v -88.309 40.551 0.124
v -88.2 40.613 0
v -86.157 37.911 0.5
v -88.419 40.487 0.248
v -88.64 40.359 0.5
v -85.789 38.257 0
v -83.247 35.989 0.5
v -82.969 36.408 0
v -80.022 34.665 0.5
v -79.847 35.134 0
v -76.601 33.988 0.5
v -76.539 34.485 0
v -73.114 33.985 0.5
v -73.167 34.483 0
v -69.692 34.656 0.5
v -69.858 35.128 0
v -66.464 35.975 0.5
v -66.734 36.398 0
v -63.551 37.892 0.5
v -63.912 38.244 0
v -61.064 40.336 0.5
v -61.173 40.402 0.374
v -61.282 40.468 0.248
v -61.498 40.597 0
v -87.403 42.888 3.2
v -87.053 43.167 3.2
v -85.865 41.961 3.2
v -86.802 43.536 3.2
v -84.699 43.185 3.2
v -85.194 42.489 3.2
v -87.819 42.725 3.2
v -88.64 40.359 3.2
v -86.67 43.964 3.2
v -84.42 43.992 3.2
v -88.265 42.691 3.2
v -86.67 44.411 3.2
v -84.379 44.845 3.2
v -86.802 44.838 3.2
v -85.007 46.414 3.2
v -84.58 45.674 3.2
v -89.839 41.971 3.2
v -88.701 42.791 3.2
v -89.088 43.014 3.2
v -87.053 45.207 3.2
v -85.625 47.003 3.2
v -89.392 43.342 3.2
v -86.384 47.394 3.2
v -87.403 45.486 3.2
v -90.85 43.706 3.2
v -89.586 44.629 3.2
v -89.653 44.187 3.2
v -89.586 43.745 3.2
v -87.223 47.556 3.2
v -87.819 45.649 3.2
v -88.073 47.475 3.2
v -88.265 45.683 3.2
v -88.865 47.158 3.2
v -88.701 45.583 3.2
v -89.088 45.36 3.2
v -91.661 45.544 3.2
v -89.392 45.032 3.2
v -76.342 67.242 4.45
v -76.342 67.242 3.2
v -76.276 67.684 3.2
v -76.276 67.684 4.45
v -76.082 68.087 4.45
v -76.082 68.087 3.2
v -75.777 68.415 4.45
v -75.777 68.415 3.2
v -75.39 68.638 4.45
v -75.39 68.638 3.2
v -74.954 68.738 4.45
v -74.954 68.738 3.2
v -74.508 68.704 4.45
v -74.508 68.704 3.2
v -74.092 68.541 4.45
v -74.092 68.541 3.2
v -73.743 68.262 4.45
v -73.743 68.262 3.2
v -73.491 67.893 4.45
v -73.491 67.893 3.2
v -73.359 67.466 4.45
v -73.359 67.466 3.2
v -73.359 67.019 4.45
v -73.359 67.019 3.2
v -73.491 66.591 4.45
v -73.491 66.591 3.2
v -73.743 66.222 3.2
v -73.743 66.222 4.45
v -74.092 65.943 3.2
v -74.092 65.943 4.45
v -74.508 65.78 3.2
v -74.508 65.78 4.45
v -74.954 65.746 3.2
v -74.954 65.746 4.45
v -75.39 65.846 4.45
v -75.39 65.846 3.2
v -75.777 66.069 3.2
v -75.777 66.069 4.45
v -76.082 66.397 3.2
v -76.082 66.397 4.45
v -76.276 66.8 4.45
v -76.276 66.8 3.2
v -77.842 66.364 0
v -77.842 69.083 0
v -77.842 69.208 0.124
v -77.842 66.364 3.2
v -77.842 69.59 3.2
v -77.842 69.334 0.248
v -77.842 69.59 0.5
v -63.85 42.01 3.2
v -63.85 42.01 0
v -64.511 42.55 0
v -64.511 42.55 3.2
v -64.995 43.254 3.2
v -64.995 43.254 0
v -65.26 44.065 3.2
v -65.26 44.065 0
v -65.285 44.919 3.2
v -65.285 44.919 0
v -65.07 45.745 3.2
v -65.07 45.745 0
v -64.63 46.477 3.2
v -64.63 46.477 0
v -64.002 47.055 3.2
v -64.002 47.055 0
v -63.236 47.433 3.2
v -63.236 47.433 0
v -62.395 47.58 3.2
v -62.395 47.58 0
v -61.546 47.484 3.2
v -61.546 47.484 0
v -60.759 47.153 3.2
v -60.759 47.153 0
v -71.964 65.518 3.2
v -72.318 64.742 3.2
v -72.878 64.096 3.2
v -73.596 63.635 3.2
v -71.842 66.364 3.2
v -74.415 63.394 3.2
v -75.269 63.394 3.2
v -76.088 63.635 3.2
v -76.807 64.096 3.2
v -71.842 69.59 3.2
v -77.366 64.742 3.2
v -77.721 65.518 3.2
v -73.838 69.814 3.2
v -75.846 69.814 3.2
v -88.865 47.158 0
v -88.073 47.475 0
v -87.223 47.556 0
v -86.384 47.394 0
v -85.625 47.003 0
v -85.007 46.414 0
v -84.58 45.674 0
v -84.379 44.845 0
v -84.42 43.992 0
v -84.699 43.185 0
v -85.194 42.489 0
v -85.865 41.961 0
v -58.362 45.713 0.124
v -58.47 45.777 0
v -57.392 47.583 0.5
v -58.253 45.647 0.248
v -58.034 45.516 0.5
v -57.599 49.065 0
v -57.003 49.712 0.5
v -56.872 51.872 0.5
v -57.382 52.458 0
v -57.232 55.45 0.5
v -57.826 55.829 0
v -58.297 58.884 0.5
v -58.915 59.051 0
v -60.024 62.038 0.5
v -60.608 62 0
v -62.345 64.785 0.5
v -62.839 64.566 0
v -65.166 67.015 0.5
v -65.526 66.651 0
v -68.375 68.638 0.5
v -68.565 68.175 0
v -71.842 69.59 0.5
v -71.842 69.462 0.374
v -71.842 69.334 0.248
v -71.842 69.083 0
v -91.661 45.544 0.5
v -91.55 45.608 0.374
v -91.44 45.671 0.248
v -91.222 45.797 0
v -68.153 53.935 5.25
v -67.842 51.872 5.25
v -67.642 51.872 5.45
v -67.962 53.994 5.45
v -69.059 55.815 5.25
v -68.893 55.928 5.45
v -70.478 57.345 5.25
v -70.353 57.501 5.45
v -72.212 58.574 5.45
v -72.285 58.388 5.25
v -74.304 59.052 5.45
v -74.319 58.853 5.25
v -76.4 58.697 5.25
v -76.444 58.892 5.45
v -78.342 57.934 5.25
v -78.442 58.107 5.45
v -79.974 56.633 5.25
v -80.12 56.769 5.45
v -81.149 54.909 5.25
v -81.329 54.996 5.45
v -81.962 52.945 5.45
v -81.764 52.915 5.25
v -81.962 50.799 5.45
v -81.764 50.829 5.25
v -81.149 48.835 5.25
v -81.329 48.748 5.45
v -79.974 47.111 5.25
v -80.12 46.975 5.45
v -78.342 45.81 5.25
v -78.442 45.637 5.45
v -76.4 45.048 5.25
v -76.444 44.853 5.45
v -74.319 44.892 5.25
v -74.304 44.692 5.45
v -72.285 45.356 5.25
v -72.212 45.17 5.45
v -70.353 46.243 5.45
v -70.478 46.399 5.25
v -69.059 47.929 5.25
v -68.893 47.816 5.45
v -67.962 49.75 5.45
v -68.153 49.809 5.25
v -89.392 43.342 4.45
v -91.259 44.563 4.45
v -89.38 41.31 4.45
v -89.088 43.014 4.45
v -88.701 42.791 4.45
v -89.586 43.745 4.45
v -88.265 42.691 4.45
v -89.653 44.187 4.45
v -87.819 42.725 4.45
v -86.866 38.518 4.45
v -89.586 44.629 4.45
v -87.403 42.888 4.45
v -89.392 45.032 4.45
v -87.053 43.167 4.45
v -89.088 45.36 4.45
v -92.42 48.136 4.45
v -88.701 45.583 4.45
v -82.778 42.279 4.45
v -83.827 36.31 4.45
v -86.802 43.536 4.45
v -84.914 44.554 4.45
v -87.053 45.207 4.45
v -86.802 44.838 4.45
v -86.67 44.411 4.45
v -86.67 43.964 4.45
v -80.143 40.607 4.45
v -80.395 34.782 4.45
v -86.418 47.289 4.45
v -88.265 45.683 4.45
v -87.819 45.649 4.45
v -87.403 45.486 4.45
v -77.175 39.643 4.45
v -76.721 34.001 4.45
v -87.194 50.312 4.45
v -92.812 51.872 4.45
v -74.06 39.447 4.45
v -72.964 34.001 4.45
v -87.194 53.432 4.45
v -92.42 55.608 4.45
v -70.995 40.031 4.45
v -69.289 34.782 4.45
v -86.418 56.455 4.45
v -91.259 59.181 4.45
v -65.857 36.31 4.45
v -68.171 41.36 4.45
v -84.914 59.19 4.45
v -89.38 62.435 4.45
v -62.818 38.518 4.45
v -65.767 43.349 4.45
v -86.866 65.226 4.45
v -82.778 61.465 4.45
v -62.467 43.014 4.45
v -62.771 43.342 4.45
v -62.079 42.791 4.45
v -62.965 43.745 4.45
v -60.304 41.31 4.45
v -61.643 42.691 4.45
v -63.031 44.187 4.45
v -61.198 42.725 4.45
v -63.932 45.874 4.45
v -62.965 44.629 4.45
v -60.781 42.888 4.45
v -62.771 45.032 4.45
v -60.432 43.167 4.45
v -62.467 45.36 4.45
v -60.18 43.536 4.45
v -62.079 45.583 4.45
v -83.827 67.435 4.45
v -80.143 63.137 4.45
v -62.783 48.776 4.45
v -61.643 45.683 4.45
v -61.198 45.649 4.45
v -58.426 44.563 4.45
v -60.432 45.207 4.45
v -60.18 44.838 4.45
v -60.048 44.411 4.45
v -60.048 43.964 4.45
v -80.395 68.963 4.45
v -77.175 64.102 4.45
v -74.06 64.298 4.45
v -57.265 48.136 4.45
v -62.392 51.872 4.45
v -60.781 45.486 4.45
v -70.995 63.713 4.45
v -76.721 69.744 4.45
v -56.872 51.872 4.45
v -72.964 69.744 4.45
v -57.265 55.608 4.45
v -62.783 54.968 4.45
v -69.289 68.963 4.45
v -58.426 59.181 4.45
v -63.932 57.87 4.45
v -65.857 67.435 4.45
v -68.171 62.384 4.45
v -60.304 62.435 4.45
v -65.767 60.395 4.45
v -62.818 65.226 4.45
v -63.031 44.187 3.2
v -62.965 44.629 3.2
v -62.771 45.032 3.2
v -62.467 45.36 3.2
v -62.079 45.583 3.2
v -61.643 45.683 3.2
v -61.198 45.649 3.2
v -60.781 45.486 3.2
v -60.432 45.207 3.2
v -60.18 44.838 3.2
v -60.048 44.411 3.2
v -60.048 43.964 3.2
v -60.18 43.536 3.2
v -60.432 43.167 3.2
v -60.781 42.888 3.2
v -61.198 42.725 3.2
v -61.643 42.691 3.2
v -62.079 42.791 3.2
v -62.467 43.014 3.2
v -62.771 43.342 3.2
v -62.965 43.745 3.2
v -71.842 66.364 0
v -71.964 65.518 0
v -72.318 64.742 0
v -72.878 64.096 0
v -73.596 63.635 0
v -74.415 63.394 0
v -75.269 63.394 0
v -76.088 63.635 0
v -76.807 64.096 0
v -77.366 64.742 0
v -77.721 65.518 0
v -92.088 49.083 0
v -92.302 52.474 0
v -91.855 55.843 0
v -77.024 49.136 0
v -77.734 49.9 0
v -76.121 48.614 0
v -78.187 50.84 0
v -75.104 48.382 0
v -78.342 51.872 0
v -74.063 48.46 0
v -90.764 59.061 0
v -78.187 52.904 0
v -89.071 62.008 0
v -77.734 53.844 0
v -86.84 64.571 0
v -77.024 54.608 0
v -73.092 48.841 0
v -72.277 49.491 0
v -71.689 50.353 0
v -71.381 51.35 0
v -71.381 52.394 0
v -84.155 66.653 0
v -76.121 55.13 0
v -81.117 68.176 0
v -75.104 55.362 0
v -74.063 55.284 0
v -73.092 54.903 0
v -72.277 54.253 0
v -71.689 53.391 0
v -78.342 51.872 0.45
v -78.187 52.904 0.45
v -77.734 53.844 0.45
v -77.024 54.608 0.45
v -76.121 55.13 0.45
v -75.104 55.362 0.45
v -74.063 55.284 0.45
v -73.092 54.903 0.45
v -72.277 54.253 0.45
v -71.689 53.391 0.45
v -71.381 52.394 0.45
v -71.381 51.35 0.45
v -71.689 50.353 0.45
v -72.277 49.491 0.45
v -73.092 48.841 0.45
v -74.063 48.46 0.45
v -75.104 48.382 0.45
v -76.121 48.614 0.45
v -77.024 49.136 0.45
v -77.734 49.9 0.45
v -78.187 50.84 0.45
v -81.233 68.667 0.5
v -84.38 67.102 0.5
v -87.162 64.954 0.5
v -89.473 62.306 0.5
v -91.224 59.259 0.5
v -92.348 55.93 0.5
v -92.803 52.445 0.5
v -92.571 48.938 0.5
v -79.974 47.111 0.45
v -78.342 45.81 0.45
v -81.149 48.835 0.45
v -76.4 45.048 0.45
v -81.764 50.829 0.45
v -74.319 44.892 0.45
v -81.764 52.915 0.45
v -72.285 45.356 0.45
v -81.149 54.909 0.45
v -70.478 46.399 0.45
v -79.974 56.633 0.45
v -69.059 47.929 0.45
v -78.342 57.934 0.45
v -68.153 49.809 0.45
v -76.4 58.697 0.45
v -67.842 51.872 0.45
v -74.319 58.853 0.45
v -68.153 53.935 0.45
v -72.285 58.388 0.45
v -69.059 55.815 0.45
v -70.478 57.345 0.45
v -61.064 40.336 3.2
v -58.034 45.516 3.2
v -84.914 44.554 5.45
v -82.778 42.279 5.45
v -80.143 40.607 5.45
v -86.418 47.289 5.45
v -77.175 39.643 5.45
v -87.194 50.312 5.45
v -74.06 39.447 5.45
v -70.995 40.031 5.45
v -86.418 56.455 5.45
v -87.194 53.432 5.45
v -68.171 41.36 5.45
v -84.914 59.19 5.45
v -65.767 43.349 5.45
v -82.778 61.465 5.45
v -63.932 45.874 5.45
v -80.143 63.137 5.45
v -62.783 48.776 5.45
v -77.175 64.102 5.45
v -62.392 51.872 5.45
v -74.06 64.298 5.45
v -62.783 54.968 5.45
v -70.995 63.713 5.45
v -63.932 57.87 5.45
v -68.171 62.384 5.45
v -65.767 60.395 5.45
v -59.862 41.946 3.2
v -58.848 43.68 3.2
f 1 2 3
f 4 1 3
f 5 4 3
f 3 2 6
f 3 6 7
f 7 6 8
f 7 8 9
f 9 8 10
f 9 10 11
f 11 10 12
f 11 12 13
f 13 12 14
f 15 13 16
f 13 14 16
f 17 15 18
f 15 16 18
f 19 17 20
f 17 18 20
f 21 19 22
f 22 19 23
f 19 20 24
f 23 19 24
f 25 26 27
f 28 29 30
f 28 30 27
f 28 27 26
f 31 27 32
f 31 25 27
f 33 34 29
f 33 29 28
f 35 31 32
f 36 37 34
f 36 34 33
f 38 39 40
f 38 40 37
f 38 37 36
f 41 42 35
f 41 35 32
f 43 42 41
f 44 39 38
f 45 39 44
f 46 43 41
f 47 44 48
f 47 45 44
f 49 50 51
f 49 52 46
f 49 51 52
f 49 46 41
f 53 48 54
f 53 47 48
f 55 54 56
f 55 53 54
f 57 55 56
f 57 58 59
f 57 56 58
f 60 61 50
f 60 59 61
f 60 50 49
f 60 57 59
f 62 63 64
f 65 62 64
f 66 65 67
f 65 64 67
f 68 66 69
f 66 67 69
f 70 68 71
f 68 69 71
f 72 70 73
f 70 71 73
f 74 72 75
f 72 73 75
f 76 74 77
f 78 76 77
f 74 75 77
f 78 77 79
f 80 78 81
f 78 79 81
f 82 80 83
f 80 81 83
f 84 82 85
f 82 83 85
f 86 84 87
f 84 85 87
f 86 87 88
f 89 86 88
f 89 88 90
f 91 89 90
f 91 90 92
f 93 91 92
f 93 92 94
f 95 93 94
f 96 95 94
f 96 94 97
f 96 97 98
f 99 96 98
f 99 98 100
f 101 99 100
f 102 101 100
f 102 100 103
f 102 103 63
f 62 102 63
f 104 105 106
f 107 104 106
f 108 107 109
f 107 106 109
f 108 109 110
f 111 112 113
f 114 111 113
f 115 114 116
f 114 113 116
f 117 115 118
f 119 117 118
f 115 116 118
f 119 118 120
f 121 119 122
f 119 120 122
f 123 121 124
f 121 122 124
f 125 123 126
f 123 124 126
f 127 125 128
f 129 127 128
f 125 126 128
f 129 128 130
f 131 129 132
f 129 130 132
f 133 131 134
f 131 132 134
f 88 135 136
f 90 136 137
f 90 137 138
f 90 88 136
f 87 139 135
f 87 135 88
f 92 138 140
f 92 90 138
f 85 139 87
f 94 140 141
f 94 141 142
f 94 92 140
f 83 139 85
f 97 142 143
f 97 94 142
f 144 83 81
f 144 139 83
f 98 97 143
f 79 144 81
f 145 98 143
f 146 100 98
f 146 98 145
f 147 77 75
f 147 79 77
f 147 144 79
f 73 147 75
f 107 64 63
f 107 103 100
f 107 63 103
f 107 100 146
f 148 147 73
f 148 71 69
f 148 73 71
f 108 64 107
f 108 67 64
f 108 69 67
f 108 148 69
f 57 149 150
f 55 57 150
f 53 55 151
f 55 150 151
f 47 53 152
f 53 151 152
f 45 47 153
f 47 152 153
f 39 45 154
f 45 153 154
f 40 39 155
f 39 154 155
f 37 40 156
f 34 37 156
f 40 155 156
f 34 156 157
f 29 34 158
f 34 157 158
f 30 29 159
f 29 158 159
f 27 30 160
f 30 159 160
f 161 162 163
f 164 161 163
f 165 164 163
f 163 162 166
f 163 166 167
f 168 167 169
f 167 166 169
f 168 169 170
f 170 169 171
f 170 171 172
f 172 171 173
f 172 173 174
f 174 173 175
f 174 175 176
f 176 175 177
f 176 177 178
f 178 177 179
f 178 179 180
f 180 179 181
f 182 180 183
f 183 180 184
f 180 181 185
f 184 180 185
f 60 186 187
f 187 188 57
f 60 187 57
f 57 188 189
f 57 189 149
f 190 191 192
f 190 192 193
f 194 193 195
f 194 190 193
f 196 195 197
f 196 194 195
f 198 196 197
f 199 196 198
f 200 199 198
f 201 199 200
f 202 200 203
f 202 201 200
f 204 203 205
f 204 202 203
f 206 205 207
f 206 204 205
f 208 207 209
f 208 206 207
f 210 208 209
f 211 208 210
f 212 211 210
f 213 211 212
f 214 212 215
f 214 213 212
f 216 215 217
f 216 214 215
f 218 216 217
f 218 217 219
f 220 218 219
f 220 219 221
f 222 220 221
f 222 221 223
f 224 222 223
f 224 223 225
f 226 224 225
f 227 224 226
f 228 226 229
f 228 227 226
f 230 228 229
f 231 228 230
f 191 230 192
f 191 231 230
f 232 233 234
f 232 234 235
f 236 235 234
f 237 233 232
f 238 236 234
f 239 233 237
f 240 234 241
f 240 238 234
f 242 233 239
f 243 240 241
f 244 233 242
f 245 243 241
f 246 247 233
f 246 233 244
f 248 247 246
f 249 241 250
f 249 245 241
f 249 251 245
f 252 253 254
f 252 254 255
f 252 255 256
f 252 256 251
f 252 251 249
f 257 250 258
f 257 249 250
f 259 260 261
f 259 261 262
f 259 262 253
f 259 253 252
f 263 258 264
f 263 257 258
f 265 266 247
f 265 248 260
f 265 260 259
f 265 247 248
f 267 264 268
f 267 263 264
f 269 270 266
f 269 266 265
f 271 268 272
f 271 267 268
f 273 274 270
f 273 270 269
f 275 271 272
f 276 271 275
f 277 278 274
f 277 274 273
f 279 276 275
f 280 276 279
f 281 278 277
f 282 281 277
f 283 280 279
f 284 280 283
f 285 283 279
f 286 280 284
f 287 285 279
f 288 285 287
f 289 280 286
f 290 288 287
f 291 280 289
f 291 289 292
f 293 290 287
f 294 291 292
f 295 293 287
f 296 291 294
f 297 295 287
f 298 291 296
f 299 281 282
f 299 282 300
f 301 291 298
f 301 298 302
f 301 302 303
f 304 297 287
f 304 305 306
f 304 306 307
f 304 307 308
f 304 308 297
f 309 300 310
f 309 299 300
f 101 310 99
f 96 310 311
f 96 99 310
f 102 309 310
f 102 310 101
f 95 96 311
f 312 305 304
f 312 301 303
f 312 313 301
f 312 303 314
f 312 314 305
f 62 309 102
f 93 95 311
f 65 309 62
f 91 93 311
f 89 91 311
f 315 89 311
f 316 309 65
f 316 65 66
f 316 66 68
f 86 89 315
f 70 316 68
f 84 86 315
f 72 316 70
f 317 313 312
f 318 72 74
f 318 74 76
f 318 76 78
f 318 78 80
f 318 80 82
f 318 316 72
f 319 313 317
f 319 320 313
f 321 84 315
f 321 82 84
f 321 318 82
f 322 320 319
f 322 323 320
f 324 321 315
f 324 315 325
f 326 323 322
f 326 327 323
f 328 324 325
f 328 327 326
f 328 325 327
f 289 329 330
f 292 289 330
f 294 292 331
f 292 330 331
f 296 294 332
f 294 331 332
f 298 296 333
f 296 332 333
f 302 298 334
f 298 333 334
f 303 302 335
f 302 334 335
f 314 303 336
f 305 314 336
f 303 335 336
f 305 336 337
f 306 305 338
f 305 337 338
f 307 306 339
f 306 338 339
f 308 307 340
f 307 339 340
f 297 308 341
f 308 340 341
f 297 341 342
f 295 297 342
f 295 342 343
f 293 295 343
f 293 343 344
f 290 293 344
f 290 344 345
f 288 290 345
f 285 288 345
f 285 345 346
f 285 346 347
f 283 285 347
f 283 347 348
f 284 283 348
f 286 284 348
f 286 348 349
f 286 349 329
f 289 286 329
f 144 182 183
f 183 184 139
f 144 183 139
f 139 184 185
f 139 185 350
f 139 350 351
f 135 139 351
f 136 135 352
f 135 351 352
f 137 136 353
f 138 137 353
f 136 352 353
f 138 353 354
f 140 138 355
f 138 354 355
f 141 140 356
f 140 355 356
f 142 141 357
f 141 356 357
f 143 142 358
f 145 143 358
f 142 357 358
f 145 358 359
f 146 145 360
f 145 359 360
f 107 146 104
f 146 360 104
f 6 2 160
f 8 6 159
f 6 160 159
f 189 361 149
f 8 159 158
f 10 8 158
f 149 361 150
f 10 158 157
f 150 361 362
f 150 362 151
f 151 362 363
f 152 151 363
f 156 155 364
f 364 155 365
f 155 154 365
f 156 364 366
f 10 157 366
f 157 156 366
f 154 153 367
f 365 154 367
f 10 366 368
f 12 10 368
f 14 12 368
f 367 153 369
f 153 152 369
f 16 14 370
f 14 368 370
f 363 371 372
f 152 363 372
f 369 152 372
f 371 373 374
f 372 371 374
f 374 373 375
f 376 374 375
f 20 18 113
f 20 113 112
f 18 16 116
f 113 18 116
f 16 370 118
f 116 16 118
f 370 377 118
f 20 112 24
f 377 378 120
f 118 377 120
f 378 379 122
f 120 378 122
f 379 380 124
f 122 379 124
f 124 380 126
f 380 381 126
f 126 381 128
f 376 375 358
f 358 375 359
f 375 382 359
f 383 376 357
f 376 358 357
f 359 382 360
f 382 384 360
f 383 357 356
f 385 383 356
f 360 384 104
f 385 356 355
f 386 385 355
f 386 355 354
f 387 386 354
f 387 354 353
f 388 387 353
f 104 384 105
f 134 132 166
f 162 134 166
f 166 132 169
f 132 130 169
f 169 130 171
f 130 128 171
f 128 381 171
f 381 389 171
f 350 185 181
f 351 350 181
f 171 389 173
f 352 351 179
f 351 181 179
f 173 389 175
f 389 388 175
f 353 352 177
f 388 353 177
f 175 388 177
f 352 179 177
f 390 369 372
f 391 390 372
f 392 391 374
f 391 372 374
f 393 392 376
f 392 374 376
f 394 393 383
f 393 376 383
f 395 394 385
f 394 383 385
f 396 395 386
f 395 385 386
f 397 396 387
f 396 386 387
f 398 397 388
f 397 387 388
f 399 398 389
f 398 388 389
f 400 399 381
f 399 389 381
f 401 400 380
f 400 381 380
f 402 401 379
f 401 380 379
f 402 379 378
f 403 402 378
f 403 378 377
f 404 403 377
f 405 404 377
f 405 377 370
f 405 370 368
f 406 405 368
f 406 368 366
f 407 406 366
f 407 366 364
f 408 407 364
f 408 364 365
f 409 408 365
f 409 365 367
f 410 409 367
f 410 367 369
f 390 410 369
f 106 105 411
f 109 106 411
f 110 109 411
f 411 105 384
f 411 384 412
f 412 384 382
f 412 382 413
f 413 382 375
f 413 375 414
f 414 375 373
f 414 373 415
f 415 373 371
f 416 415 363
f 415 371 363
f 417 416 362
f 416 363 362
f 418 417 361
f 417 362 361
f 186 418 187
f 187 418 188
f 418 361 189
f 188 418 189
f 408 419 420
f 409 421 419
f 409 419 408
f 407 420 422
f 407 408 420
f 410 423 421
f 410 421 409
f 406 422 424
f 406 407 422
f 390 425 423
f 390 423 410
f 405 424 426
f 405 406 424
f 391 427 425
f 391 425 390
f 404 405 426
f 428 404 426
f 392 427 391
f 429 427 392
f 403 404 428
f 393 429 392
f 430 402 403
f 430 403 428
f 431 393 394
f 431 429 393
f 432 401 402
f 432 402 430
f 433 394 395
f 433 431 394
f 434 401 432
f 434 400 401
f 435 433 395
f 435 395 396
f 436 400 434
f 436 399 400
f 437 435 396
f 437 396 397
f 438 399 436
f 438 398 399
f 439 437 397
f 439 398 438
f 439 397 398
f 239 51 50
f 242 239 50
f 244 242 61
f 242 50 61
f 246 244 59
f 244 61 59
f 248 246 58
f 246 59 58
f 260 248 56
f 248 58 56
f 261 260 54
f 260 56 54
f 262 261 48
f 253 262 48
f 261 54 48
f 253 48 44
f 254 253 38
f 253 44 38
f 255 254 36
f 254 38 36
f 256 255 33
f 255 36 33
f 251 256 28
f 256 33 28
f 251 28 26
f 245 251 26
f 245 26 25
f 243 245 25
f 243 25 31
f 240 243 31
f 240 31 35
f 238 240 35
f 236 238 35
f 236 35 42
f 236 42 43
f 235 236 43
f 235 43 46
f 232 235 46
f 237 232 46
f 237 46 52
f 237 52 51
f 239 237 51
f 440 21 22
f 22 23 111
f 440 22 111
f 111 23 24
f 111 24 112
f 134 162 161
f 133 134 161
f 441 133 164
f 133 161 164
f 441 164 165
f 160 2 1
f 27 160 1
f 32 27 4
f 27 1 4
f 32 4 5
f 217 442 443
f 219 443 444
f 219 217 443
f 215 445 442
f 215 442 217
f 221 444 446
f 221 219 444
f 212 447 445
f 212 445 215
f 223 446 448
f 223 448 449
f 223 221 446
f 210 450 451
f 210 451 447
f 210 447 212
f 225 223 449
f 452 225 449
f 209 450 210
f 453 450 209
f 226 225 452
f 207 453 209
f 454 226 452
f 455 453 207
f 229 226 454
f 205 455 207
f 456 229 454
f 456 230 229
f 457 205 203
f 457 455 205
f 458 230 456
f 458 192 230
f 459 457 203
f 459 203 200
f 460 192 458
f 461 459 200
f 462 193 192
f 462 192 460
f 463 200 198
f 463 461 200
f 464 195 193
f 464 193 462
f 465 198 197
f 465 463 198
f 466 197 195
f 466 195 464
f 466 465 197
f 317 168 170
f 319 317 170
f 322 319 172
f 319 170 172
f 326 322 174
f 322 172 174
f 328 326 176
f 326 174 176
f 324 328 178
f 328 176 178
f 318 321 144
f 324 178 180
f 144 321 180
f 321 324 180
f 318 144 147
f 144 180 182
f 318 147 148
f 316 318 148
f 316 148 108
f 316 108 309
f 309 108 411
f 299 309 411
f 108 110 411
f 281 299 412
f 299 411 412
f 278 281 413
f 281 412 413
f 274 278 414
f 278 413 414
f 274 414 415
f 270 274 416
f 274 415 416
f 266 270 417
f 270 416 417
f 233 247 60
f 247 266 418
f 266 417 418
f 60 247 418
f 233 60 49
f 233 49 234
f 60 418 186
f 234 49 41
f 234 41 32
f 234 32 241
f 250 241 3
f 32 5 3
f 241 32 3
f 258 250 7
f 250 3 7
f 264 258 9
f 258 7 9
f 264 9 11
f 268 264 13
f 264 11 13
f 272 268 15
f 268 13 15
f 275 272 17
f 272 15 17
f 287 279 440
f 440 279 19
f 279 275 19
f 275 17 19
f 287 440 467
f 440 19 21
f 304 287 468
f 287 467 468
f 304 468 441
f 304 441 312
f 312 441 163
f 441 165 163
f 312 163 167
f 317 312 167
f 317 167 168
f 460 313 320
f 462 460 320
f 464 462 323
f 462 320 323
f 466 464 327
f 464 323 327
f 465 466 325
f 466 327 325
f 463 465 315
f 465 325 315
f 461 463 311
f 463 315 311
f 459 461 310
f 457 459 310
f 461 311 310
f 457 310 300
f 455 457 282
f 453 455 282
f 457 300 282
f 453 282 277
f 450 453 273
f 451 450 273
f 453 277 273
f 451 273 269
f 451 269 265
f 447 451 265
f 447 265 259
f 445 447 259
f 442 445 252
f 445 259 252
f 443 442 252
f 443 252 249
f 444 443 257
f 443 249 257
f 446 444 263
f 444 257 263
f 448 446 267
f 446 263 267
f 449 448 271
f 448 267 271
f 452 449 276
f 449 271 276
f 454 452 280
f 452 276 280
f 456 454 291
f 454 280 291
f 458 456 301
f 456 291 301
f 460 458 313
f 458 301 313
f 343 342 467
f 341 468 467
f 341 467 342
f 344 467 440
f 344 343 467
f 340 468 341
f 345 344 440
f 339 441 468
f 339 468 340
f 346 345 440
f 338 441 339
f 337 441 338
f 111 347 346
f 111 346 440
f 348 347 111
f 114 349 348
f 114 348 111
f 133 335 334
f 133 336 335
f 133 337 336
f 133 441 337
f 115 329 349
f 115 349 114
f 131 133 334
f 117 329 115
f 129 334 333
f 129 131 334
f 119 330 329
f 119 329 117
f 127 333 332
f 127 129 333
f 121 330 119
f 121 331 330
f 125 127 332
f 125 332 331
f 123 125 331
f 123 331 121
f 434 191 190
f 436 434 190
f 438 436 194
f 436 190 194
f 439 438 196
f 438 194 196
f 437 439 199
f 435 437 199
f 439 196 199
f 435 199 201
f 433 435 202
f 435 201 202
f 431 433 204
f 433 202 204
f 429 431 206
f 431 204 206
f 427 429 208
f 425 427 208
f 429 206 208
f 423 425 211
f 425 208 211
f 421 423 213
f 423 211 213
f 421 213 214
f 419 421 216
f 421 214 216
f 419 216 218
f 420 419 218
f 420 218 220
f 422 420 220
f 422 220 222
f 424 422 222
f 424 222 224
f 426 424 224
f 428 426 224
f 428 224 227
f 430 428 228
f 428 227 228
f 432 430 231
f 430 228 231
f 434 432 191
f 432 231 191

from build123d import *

# Parameters (mm, degrees)
ESQUISSE1_R             = 17.97
BOSS_EXTRU_1_DEPTH      = 4.45
ESQUISSE2_R             = 12.45
BOSS_EXTRU_2_DEPTH      = 1
CHANFREIN1_SIZE         = 0.5
ESQUISSE5_R             = 1.5
ENL_V_MAT_EXTRU_1_DEPTH = 6.45
ESQUISSE6_R             = 3.5
ENL_V_MAT_EXTRU_2_DEPTH = 6.45
ESQUISSE7_R             = 7
ENL_V_MAT_EXTRU_3_DEPTH = 5
ENL_V_MAT_EXTRU_4_DEPTH = 3.2
CHANFREIN2_SIZE         = 0.2


with BuildPart() as part:
    # Esquisse1 → Boss.-Extru.1 (new body)
    with BuildSketch(Plane.XY):
        with Locations((-74.842203198, 51.872077922)):
            Circle(ESQUISSE1_R)
    extrude(amount=BOSS_EXTRU_1_DEPTH)

    # Esquisse2 → Boss.-Extru.2 (add)
    with BuildSketch(Plane.XY.offset(4.45)):
        with Locations((-74.842203198, 51.872077922)):
            Circle(ESQUISSE2_R)
    extrude(amount=BOSS_EXTRU_2_DEPTH)

    # Chanfrein1
    chanfrein1_edges = [part.edges().sort_by_distance(p)[0] for p in [
        (-92.812203198, 51.872077922, 0),
    ]]
    chamfer(chanfrein1_edges, length=CHANFREIN1_SIZE)

    # Esquisse5 → Enlèv. mat.-Extru.1 (cut, through all)
    with BuildSketch(Plane(origin=(0, 0, 0), x_dir=(-1, 0, 0), z_dir=(0, 0, -1))):
        with Locations((74.842203198, 67.242077922)):
            Circle(ESQUISSE5_R)
        with Locations((61.531392742, 44.187077922)):
            Circle(ESQUISSE5_R)
        with Locations((88.153013654, 44.187077922)):
            Circle(ESQUISSE5_R)
    extrude(amount=-ENL_V_MAT_EXTRU_1_DEPTH, mode=Mode.SUBTRACT)

    # Esquisse6 → Enlèv. mat.-Extru.2 (cut, through all)
    with BuildSketch(Plane(origin=(0, 0, 0), x_dir=(-1, 0, 0), z_dir=(0, 0, -1))):
        with Locations((74.842203198, 51.872077922)):
            Circle(ESQUISSE6_R)
    extrude(amount=-ENL_V_MAT_EXTRU_2_DEPTH, mode=Mode.SUBTRACT)

    # Esquisse7 → Enlèv. mat.-Extru.3 (cut)
    with BuildSketch(Plane.XY.offset(5.45)):
        with Locations((-74.842203198, 51.872077922)):
            Circle(ESQUISSE7_R)
    extrude(amount=-ENL_V_MAT_EXTRU_3_DEPTH, mode=Mode.SUBTRACT)

    # Esquisse8 → Enlèv. mat.-Extru.4 (cut)
    with BuildSketch(Plane(origin=(0, 0, 0), x_dir=(-1, 0, 0), z_dir=(0, 0, -1))):
        with BuildLine():
            Line((71.842203198, 70.411905134), (71.842203198, 66.363654544))
            ThreePointArc((71.842203198, 66.363654544), (74.842203198, 63.363654544), (77.842203198, 66.363654544))
            Line((77.842203198, 66.363654544), (77.842203198, 70.411905134))
            Line((77.842203198, 70.411905134), (71.842203198, 70.411905134))
        make_face()
        with BuildLine():
            Line((60.379554388, 39.925212907), (63.849582418, 42.010216097))
            ThreePointArc((63.849582418, 42.010216097), (64.875970095, 46.126832224), (60.759353968, 47.153219901))
            Line((60.759353968, 47.153219901), (57.289325938, 45.068216711))
            Line((57.289325938, 45.068216711), (60.379554388, 39.925212907))
        make_face()
        with BuildLine():
            Line((92.371338943, 45.133431645), (88.865451092, 47.15755694))
            ThreePointArc((88.865451092, 47.15755694), (84.76737488, 46.059480728), (85.865451092, 41.961404517))
            Line((85.865451092, 41.961404517), (89.371338943, 39.937279222))
            Line((89.371338943, 39.937279222), (92.371338943, 45.133431645))
        make_face()
    extrude(amount=-ENL_V_MAT_EXTRU_4_DEPTH, mode=Mode.SUBTRACT)

    # Chanfrein2
    chanfrein2_edges = [part.edges().sort_by_distance(p)[0] for p in [
        (-81.842203198, 51.872077922, 5.45),
    ]]
    chamfer(chanfrein2_edges, length=CHANFREIN2_SIZE)


solid = part.part
